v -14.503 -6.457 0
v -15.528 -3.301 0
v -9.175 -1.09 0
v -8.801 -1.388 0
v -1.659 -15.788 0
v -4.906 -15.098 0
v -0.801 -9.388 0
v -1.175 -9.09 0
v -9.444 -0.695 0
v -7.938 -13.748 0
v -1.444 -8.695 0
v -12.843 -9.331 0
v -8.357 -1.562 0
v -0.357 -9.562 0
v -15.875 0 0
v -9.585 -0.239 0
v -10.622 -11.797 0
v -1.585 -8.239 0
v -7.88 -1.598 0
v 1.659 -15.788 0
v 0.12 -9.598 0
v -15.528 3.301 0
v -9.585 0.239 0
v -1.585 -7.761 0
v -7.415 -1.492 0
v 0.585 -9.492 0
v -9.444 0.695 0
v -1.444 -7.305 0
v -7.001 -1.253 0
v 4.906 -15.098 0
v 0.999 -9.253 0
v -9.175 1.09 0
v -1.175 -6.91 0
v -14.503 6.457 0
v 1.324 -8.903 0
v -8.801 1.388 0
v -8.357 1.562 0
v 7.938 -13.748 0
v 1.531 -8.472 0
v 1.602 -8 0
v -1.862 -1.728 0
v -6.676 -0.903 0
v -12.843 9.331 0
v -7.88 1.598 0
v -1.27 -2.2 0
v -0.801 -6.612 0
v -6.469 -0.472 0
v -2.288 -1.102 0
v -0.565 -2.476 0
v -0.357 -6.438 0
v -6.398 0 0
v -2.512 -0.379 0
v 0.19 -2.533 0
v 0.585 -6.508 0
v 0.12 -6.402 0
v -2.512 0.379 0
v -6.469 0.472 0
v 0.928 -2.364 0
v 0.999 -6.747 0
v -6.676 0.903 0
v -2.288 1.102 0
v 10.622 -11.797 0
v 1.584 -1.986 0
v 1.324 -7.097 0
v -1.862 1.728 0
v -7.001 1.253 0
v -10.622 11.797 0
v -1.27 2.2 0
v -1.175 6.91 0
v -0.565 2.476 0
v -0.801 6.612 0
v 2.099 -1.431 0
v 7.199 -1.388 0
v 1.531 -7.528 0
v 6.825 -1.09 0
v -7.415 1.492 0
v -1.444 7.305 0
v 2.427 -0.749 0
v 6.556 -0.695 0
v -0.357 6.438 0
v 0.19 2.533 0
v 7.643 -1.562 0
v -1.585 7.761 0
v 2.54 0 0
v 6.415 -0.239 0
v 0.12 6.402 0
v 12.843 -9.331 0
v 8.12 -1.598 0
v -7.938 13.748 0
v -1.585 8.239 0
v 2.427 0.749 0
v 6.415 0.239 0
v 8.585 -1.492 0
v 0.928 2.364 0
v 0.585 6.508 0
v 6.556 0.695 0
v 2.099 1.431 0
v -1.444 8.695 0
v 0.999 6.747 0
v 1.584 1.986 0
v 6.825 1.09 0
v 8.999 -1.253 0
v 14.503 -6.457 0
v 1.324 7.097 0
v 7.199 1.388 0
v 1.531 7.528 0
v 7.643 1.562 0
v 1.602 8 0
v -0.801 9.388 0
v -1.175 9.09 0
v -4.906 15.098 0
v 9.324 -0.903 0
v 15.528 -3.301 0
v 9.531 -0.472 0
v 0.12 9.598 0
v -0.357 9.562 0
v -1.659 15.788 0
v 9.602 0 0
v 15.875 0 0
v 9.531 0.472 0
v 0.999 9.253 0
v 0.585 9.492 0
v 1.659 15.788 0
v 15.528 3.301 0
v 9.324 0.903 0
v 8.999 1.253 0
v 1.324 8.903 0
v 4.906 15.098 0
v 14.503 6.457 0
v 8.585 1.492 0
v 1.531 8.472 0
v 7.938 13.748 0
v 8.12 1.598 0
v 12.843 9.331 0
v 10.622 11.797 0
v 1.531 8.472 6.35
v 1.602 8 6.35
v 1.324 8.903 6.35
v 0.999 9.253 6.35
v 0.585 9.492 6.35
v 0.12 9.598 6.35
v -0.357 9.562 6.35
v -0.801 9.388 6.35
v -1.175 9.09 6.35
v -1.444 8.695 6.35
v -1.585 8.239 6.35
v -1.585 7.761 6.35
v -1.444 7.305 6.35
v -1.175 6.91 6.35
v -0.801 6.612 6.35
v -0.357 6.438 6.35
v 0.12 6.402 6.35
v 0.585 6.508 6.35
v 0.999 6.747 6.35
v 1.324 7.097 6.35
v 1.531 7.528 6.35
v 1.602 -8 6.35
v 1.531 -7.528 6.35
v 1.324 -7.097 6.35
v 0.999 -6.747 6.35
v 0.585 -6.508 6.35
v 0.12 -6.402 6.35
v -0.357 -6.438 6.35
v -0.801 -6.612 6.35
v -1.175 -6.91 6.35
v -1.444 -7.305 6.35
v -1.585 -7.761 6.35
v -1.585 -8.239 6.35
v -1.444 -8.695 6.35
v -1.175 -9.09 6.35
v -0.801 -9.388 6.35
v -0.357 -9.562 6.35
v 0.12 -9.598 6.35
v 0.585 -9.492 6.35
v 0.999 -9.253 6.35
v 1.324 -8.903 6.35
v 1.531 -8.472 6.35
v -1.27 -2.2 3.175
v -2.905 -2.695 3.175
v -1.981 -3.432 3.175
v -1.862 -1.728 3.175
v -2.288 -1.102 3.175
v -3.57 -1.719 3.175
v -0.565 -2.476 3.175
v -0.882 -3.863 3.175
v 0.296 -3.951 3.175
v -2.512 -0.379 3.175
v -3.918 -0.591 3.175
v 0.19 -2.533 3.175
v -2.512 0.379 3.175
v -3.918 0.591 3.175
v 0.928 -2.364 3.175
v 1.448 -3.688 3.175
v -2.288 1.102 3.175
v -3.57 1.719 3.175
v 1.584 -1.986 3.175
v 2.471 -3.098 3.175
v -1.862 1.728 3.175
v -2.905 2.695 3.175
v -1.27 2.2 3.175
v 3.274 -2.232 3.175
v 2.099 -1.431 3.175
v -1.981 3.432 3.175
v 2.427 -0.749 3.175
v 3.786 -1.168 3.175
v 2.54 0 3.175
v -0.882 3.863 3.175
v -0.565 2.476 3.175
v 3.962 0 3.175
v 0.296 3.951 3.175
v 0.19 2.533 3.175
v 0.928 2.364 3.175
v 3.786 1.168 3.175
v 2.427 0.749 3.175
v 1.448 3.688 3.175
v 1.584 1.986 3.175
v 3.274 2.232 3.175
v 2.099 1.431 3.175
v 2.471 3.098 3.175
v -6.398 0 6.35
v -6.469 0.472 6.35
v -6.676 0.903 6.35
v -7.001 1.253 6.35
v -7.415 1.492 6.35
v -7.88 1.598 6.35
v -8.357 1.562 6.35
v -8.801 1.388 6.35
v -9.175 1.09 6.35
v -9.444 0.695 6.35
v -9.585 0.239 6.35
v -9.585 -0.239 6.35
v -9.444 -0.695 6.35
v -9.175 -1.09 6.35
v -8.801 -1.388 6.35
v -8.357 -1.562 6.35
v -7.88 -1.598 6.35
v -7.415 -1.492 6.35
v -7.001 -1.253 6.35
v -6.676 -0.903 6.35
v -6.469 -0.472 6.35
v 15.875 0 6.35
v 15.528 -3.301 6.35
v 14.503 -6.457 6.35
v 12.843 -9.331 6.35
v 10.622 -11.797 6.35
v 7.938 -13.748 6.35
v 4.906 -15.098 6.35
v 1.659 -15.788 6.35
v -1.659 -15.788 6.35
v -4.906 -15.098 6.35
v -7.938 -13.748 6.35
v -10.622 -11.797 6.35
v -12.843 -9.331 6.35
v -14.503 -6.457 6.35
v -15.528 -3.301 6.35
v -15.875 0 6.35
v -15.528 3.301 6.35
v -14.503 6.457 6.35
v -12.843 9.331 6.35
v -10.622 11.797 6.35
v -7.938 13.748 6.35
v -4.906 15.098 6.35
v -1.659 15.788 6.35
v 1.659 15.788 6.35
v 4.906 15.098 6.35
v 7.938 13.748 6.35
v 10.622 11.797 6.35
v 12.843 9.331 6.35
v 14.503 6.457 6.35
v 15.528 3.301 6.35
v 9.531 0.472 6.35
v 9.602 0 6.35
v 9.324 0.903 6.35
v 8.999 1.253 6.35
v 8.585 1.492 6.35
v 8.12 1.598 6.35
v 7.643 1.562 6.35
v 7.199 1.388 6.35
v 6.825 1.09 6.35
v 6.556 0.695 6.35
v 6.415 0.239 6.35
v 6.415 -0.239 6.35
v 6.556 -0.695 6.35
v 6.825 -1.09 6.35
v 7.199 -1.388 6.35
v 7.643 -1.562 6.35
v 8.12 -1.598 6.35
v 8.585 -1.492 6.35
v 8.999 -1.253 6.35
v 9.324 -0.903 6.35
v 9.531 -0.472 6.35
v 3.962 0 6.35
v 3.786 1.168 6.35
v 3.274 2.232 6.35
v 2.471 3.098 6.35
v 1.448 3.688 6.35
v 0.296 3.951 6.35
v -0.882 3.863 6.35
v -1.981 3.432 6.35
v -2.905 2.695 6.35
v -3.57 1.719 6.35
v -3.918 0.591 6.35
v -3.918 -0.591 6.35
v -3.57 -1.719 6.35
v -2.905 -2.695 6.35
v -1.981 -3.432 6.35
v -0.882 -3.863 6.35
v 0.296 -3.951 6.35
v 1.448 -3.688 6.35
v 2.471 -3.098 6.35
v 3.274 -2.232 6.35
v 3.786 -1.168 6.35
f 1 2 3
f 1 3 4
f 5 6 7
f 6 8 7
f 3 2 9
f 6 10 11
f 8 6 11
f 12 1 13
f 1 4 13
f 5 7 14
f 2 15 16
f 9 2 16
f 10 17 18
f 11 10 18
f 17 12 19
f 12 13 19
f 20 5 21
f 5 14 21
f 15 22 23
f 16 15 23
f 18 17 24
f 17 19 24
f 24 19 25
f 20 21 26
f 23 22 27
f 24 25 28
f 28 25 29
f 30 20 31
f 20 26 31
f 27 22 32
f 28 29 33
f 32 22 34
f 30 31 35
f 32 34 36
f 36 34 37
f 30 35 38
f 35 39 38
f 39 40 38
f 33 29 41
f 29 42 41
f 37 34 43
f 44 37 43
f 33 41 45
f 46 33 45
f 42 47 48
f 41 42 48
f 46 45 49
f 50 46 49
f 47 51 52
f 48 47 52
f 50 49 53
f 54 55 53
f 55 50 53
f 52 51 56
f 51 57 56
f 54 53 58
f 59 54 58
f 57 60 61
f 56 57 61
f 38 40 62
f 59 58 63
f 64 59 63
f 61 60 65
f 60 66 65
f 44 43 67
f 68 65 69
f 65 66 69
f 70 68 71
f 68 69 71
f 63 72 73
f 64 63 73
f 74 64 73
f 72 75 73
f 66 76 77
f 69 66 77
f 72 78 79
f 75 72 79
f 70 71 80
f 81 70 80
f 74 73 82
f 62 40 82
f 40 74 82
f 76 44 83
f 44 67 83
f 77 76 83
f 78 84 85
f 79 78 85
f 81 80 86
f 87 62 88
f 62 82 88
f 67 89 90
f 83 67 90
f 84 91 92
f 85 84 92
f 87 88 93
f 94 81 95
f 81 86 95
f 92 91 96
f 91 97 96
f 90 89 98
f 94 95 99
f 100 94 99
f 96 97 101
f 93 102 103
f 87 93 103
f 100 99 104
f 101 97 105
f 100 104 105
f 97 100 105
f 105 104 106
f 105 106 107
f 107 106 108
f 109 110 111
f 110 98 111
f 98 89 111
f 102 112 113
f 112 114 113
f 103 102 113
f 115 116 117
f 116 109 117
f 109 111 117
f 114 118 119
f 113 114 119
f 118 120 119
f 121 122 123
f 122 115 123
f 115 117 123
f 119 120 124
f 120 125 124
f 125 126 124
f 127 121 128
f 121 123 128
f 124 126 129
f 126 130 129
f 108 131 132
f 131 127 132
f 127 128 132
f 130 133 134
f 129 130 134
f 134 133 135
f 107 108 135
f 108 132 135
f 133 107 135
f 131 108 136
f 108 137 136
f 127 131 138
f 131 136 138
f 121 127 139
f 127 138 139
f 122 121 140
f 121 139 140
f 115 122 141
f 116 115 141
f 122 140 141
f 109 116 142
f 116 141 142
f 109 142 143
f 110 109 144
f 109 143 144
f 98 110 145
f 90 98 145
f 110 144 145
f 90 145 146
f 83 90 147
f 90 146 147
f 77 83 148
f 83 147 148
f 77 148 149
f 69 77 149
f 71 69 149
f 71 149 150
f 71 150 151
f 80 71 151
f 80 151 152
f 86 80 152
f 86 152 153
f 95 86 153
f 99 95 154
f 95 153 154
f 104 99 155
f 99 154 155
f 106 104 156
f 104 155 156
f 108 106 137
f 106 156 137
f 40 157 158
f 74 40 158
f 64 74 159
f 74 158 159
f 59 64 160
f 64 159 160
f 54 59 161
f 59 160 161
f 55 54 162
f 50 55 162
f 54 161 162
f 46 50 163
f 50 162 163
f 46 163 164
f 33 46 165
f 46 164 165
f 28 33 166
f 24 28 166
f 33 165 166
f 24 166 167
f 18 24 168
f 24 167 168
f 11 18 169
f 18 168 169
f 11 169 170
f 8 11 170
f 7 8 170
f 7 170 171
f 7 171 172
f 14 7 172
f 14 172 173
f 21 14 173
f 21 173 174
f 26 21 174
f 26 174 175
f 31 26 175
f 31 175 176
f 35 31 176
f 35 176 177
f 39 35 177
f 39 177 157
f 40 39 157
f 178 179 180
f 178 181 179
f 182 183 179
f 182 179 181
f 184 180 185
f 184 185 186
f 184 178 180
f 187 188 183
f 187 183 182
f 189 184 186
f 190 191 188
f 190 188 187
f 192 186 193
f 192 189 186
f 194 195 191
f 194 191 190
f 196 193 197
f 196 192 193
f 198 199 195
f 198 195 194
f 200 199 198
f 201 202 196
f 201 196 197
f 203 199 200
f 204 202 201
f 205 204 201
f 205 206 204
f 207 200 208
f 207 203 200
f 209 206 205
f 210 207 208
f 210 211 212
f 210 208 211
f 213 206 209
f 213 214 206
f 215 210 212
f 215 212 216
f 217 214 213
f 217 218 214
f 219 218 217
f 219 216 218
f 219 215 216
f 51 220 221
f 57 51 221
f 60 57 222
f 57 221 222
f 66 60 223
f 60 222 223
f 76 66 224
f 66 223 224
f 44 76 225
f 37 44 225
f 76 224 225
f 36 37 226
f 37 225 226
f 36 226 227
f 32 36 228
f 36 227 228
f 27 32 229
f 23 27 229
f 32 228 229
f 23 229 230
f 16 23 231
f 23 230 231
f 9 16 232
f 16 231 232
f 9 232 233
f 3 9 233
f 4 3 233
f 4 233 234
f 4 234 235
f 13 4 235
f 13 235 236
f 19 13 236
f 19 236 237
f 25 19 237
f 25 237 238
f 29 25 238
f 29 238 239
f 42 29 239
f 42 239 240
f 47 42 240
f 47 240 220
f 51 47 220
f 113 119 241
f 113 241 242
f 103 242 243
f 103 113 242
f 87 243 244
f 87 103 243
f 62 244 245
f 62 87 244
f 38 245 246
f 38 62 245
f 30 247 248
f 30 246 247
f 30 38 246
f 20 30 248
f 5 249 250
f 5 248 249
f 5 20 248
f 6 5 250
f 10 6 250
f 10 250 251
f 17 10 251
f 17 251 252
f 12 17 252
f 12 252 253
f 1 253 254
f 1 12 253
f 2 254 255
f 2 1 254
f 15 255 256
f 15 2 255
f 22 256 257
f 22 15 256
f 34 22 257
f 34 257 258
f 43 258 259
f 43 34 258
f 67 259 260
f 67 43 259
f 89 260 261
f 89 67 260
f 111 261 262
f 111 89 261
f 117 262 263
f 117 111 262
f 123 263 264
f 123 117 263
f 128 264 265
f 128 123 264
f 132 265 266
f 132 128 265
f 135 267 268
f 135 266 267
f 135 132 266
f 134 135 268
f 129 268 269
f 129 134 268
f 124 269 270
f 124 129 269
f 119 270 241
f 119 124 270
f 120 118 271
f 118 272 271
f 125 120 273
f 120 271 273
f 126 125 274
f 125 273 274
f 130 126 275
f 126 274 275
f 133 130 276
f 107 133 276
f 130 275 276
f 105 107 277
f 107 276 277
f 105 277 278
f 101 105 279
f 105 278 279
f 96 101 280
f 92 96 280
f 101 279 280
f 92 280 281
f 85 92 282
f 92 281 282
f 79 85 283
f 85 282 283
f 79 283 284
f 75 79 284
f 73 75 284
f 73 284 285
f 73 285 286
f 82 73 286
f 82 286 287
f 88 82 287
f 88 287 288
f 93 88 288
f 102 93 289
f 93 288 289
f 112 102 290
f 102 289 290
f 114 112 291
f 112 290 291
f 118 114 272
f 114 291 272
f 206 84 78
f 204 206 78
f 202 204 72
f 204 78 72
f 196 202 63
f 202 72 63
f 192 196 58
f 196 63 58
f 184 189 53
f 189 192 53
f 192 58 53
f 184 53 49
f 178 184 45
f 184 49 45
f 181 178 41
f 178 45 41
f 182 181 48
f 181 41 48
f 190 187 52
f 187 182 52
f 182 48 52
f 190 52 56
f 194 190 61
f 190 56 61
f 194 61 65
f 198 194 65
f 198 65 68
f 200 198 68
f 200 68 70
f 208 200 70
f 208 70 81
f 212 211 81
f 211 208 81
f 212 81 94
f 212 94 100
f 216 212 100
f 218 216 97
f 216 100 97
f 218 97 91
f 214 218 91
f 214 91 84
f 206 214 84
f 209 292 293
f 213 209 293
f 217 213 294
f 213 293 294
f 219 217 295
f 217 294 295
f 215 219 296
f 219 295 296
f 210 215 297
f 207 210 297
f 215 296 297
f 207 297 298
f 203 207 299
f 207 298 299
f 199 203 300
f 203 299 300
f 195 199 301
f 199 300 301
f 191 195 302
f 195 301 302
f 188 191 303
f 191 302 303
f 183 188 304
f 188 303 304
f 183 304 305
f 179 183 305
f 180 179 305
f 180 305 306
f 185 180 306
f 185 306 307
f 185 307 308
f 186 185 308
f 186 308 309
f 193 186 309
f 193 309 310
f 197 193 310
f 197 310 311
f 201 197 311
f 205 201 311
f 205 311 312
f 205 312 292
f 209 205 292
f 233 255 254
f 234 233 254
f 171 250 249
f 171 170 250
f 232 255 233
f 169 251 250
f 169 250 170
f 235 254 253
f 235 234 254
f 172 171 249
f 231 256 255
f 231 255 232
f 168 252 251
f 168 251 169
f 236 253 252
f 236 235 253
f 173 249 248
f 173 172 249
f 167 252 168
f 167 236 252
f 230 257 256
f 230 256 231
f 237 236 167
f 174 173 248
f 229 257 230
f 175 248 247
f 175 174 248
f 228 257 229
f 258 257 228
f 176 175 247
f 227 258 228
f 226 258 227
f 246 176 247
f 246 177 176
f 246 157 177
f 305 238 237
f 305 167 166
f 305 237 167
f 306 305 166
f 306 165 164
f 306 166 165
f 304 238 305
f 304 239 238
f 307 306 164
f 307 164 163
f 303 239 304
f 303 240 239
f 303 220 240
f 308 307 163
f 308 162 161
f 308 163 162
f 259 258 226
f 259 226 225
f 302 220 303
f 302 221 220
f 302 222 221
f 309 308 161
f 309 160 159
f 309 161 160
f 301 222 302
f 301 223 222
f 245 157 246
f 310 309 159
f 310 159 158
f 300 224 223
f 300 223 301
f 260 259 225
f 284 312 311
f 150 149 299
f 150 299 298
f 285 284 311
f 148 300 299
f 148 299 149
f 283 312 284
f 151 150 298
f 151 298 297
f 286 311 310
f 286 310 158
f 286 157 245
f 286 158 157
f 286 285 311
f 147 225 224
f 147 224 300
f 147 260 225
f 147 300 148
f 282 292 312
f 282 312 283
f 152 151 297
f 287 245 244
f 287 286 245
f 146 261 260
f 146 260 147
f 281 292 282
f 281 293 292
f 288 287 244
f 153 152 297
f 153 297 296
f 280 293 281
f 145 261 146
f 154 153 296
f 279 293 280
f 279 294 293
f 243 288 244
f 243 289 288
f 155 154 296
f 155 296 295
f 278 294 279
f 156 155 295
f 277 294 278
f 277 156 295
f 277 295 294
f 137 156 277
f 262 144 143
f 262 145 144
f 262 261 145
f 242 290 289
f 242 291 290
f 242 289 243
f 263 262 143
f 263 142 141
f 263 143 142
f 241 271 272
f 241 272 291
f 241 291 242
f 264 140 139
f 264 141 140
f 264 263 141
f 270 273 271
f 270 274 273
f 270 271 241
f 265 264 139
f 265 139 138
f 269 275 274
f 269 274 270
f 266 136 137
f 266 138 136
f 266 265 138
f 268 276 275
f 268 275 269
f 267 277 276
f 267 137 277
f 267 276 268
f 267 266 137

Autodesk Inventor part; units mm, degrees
ref_plane "YZ Plane" through (0, 0, 0) normal (1, 0, 0) x (0, 1, 0)
ref_plane "XZ Plane" through (0, 0, 0) normal (0, 1, 0) x (-1, 0, 0)
ref_plane "XY Plane" through (0, 0, 0) normal (0, 0, 1) x (1, 0, 0)
sketch "Sketch1" plane through (0, 0, 0) normal (0, 0, 1) x (1, 0, 0)
  circle A0 centre (0, 0) radius 2.54
  circle A1 centre (0, 0) radius 15.875
  dimension "d0" = 5.08
  dimension "d1" = 31.75
extrude "Extrusion1" add sketch "Sketch1" along normal blind 6.35
sketch "Sketch2" plane through (0, 0, 6.35) normal (0, 0, 1) x (1, 0, 0)
  circle A0 centre (0, 0) radius 11
  circle A1 centre (0, 0) radius 3.9625
  circle A2 centre (0, -8) radius 1.6025
  circle A3 centre (8, 0) radius 1.6025
  circle A4 centre (-8, 0) radius 1.6025
  circle A5 centre (0, 8) radius 1.6025
extrude "Extrusion2" cut sketch "Sketch2" against normal blind 6.35 contours A2 | A3 | A4 | A5
sketch "Sketch4" plane through (0, 0, 6.35) normal (0, 0, 1) x (1, 0, 0)
  circle A0 centre (0, 0) radius 2.54 projected
  circle A1 centre (0, 0) radius 15.875 projected
  circle A2 centre (0, 0) radius 3.9624
  dimension "d6" = 7.9248
extrude "Extrusion3" cut sketch "Sketch4" against normal blind 3.175 contours A2
properties part number "end piece for spool"
